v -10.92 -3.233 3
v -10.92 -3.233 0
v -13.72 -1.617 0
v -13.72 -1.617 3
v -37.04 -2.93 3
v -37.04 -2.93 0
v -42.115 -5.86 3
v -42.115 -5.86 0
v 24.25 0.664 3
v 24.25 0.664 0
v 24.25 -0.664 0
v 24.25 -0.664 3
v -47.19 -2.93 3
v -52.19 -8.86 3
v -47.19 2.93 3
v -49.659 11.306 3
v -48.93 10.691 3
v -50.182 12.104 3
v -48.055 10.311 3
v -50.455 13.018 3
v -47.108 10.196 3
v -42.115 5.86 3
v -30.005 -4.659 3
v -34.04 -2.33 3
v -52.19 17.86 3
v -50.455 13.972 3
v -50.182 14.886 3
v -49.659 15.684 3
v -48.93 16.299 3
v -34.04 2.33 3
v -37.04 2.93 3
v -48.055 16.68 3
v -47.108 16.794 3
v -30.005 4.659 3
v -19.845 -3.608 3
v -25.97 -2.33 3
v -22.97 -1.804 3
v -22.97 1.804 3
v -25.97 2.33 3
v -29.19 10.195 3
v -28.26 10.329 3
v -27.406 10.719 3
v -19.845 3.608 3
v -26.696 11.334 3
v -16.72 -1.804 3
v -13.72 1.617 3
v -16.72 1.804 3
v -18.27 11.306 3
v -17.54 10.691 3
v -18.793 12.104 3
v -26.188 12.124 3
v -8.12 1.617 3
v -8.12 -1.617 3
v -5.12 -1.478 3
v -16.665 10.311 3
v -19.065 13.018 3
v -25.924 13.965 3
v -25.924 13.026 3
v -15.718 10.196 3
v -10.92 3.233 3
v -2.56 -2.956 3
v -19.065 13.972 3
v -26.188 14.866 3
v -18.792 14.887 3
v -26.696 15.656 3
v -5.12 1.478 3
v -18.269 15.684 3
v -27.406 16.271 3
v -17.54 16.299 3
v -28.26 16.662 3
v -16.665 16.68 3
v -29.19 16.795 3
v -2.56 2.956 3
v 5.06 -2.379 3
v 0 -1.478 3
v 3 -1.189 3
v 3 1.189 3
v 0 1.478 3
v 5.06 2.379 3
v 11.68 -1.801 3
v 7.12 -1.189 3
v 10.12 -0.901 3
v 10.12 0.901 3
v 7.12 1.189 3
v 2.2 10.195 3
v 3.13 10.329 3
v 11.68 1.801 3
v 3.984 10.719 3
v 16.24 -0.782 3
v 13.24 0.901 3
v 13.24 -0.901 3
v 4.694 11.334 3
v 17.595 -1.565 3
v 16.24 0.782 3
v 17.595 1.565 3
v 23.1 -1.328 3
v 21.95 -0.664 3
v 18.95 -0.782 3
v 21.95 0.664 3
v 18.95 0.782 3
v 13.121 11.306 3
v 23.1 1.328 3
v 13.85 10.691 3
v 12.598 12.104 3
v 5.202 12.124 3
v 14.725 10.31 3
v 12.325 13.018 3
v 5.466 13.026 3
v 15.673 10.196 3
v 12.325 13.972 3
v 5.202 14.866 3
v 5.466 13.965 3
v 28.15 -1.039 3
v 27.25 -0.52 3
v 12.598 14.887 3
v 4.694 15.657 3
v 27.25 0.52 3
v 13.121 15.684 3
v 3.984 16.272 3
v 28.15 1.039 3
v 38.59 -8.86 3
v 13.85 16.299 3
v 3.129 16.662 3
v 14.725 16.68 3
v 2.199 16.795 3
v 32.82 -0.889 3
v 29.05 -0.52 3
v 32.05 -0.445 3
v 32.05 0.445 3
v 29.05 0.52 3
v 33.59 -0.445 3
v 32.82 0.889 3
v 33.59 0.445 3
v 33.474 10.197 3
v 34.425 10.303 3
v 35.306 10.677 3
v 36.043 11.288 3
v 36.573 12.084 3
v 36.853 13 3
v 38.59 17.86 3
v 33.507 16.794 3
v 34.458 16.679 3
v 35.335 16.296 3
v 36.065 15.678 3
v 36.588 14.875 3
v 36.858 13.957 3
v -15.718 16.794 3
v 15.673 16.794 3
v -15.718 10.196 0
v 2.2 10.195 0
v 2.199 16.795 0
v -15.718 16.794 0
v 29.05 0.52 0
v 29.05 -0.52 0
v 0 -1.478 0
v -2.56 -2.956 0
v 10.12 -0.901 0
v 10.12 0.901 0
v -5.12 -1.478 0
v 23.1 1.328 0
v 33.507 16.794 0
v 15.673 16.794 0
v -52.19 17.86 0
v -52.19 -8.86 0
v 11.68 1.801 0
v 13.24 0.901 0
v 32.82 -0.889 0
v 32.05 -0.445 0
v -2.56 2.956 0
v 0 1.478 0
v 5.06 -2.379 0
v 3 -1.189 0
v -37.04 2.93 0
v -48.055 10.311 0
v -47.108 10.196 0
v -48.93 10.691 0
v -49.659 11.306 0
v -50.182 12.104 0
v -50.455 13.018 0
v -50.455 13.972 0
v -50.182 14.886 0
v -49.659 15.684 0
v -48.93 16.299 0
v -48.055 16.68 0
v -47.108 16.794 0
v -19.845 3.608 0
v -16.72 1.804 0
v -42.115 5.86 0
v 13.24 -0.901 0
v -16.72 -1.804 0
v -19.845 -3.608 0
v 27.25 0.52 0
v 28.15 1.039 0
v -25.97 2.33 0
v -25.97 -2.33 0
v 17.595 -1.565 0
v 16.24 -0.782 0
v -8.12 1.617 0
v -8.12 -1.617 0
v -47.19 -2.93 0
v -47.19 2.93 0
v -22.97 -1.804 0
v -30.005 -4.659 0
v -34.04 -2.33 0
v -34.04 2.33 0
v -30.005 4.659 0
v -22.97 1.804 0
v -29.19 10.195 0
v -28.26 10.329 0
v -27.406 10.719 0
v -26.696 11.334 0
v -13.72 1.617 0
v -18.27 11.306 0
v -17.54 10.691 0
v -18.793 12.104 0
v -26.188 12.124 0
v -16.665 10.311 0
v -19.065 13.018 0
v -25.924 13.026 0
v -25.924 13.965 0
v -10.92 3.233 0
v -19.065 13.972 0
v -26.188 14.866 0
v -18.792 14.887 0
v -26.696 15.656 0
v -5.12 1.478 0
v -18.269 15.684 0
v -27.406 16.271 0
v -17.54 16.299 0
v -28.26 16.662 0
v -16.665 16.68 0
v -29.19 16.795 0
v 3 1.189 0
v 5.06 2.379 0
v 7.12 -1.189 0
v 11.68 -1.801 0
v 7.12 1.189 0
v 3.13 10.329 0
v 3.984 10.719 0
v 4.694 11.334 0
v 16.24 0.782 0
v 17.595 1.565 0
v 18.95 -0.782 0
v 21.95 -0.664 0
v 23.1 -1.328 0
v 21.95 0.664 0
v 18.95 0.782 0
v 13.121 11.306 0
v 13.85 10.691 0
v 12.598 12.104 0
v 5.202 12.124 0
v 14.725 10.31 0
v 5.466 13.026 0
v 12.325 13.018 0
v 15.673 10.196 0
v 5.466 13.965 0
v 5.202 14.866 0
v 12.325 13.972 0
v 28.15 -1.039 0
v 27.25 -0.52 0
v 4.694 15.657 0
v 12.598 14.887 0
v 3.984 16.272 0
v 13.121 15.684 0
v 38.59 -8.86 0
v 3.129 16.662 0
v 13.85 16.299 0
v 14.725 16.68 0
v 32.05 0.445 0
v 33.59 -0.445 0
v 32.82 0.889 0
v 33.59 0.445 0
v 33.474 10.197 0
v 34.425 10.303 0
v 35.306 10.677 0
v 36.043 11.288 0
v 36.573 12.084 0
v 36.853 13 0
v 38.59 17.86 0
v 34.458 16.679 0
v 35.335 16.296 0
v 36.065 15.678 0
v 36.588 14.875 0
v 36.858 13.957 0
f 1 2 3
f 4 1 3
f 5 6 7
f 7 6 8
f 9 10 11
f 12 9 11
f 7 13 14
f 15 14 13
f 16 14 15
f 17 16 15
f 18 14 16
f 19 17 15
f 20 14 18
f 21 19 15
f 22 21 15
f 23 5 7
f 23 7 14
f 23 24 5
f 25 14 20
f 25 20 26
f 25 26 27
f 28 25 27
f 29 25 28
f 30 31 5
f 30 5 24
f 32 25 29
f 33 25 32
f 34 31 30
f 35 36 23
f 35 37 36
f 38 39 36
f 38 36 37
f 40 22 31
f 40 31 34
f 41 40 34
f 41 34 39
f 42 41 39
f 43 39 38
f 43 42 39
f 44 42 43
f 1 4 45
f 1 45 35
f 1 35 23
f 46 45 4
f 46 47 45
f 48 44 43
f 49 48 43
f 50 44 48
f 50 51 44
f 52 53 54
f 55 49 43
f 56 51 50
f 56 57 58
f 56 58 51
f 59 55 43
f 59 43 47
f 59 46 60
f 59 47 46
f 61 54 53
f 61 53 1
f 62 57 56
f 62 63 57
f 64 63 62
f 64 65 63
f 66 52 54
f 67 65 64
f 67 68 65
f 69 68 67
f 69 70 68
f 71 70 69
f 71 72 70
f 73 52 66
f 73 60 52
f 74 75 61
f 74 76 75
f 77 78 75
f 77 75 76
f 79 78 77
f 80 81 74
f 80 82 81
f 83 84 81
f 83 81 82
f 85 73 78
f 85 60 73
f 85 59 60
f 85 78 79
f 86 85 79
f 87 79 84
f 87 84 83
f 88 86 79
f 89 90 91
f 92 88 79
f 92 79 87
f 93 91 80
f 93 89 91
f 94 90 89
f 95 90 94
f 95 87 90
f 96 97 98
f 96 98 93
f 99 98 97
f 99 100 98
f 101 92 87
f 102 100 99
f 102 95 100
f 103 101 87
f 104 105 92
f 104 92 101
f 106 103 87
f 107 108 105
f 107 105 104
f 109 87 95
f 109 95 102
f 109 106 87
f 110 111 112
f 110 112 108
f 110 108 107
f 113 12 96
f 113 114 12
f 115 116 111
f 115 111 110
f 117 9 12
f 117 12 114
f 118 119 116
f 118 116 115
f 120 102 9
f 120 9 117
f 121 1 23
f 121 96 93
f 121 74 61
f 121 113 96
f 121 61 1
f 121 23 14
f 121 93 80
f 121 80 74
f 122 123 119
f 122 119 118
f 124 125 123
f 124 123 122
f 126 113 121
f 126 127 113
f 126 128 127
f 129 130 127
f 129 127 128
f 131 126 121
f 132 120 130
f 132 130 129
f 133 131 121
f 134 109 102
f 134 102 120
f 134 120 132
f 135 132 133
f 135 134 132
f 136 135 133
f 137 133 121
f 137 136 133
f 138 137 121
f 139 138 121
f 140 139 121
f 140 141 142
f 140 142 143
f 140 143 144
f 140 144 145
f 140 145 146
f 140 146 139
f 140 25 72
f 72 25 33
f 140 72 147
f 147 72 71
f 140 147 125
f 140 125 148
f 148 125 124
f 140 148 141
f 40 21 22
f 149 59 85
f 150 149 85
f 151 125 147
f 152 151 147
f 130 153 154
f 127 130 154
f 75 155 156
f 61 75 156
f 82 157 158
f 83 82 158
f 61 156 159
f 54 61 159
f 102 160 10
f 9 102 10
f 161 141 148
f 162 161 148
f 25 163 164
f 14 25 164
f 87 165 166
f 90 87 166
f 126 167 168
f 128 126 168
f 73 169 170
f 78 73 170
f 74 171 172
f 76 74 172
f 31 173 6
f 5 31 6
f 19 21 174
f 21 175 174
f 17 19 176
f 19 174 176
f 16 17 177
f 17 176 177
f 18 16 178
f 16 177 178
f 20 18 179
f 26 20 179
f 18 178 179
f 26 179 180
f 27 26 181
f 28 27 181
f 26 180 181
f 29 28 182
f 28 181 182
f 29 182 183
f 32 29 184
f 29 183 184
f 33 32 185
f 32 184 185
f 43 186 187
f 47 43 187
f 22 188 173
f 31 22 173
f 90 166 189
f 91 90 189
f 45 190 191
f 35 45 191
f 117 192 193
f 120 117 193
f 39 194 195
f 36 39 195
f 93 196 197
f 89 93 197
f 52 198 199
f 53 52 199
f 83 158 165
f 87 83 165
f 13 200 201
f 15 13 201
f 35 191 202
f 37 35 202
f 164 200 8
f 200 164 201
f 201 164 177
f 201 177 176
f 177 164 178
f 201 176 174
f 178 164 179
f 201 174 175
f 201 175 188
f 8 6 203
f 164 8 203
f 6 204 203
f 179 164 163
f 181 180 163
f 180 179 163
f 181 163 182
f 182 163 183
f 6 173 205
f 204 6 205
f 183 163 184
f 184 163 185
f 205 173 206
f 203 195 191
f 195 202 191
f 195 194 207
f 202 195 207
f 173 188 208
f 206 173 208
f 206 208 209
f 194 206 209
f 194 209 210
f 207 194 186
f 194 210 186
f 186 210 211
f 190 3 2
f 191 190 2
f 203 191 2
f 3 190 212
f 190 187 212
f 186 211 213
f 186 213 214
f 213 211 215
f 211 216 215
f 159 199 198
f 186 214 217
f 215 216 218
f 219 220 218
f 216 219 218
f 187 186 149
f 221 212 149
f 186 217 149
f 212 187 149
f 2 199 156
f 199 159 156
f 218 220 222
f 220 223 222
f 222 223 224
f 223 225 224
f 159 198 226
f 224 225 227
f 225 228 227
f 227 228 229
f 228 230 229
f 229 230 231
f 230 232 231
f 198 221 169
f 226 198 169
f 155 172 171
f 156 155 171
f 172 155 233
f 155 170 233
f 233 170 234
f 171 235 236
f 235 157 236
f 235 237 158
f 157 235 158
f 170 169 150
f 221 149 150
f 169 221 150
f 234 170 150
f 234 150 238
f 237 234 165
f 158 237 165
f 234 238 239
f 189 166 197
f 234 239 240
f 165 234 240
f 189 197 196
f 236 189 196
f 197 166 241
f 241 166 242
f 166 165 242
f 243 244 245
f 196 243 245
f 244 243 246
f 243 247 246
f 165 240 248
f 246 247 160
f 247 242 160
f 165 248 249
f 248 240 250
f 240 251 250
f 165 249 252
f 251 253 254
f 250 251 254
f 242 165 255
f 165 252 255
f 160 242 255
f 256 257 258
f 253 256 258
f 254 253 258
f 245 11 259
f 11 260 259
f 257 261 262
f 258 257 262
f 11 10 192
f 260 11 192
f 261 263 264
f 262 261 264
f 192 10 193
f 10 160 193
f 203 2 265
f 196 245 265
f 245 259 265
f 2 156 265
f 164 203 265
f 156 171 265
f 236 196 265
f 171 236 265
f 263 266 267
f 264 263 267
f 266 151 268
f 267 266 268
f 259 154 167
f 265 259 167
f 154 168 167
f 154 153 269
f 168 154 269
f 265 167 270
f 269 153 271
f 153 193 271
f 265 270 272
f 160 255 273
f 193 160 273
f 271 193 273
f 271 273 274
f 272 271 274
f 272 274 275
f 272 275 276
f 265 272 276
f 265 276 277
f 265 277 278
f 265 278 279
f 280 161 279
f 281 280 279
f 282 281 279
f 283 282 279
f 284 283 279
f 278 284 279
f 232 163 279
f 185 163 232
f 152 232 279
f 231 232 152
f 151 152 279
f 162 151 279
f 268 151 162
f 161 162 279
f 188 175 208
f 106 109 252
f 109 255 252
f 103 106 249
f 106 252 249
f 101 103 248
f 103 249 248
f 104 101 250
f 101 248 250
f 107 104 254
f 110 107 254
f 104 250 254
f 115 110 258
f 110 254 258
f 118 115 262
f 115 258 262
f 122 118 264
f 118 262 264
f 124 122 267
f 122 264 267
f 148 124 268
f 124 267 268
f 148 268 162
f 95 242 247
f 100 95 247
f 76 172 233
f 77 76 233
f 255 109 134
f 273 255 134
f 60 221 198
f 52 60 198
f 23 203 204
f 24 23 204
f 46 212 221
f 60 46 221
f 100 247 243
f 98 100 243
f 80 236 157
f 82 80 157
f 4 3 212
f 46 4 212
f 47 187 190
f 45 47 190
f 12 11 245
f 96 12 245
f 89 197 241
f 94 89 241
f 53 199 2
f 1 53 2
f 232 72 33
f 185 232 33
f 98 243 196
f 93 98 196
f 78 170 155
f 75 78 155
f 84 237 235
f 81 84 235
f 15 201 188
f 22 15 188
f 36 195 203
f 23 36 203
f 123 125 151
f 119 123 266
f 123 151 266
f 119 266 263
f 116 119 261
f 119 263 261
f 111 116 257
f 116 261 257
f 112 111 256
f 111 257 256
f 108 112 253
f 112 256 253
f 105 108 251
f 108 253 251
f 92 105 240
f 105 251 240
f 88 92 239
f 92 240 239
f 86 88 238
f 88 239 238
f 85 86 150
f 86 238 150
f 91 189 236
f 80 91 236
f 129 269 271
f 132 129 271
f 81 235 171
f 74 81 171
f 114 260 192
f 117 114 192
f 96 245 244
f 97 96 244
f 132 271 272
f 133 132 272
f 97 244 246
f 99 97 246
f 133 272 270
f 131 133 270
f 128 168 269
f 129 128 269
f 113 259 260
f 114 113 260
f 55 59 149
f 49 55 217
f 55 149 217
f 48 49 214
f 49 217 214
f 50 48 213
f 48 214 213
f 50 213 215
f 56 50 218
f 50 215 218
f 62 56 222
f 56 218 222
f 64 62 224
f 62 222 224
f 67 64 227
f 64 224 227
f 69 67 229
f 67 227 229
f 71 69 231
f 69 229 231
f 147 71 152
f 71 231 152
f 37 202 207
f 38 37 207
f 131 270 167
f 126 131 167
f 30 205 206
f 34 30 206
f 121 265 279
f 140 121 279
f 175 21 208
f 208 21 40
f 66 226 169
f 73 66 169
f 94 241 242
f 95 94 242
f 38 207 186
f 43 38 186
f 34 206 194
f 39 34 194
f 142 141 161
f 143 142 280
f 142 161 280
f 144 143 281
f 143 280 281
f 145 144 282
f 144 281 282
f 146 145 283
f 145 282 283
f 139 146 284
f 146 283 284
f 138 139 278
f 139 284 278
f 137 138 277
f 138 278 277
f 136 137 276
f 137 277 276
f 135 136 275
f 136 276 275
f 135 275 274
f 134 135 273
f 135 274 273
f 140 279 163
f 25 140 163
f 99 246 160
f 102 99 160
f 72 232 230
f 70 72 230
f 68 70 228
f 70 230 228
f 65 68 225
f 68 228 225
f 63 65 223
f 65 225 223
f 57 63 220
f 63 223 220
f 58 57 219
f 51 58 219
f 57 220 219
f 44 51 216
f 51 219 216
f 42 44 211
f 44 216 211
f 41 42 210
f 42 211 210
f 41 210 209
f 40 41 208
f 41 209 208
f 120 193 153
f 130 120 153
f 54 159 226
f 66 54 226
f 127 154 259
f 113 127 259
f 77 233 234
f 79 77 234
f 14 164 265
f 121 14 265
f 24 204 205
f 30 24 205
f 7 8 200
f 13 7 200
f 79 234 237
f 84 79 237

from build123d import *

# Parameters (mm, degrees)
F0_W     = 90.78
F0_H     = 17.7202104645
F1_DEPTH = 3
F3_D     = 6.6
F5_DEPTH = 25


with BuildPart() as f1:
    # F0 (on Top) → F1 (new body)
    with BuildSketch(Plane.XY):
        Polygon((-52.19, 13.3601052323), (-52.19, 8.8601052323), (38.59, 8.8601052323), (38.59, 13.3601052323), (38.59, 17.8601052323), (-52.19, 17.8601052323), align=None)
        with Locations((-6.8, 0)):
            Rectangle(F0_W, F0_H)
        Polygon((-42.115, 5.8601052323), (-37.04, 2.9300526161), (-37.04, -2.9300526161), (-42.115, -5.8601052323), (-47.19, -2.9300526161), (-47.19, 2.9300526161), align=None, mode=Mode.SUBTRACT)
        Polygon((-30.005, 4.6592166724), (-25.97, 2.3296083362), (-25.97, -2.3296083362), (-30.005, -4.6592166724), (-34.04, -2.3296083362), (-34.04, 2.3296083362), align=None, mode=Mode.SUBTRACT)
        Polygon((-19.845, 3.6084391824), (-16.72, 1.8042195912), (-16.72, -1.8042195912), (-19.845, -3.6084391824), (-22.97, -1.8042195912), (-22.97, 1.8042195912), align=None, mode=Mode.SUBTRACT)
        Polygon((-10.92, 3.2331615075), (-8.12, 1.6165807537), (-8.12, -1.6165807537), (-10.92, -3.2331615075), (-13.72, -1.6165807537), (-13.72, 1.6165807537), align=None, mode=Mode.SUBTRACT)
        Polygon((-2.56, 2.9560333783), (0, 1.4780166891), (0, -1.4780166891), (-2.56, -2.9560333783), (-5.12, -1.4780166891), (-5.12, 1.4780166891), align=None, mode=Mode.SUBTRACT)
        Polygon((5.06, 2.3786831091), (7.12, 1.1893415545), (7.12, -1.1893415545), (5.06, -2.3786831091), (3, -1.1893415545), (3, 1.1893415545), align=None, mode=Mode.SUBTRACT)
        Polygon((11.68, 1.8013328399), (13.24, 0.9006664199), (13.24, -0.9006664199), (11.68, -1.8013328399), (10.12, -0.9006664199), (10.12, 0.9006664199), align=None, mode=Mode.SUBTRACT)
        Polygon((17.595, 1.5646192295), (18.95, 0.7823096148), (18.95, -0.7823096148), (17.595, -1.5646192295), (16.24, -0.7823096148), (16.24, 0.7823096148), align=None, mode=Mode.SUBTRACT)
        Polygon((23.1, 1.3279056191), (24.25, 0.6639528096), (24.25, -0.6639528096), (23.1, -1.3279056191), (21.95, -0.6639528096), (21.95, 0.6639528096), align=None, mode=Mode.SUBTRACT)
        Polygon((28.15, 1.0392304845), (29.05, 0.5196152423), (29.05, -0.5196152423), (28.15, -1.0392304845), (27.25, -0.5196152423), (27.25, 0.5196152423), align=None, mode=Mode.SUBTRACT)
        Polygon((32.82, 0.8891194146), (33.59, 0.4445597073), (33.59, -0.4445597073), (32.82, -0.8891194146), (32.05, -0.4445597073), (32.05, 0.4445597073), align=None, mode=Mode.SUBTRACT)
    extrude(amount=F1_DEPTH)

    # F3 (through all)
    with Locations(Plane.XY.offset(3)):
        with Locations((-47.19, 13.4951905284), (-29.19, 13.4951905284), (-15.8, 13.4951905284), (2.2, 13.4951905284), (15.59, 13.4951905284), (33.59, 13.4951905284)):
            Hole(F3_D / 2)

    # F4 (on face) → F5 (cut)
    with BuildSketch(Plane.XY.offset(3)):
        with BuildLine():
            Line((-29.1901885501, 16.795190523), (-47.1078067859, 16.794166775))
            ThreePointArc((-47.1078067859, 16.794166775), (-44.8276666613, 15.79939998), (-43.89, 13.4951905284))
            ThreePointArc((-43.89, 13.4951905284), (-44.8276666613, 11.1909810768), (-47.1078067859, 10.1962142818))
            Line((-47.1078067859, 10.1962142818), (-29.1901885501, 10.1951905338))
            ThreePointArc((-29.1901885501, 10.1951905338), (-32.49, 13.4951905284), (-29.1901885501, 16.795190523))
        make_face()
        with BuildLine():
            Line((2.1994360639, 16.7951904802), (-15.7178067781, 16.7941667748))
            ThreePointArc((-15.7178067781, 16.7941667748), (-13.4376666586, 15.7993999772), (-12.5, 13.4951905284))
            ThreePointArc((-12.5, 13.4951905284), (-13.4377971224, 11.1908473324), (-15.7181803424, 10.1962049959))
            Line((-15.7181803424, 10.1962049959), (2.1998131641, 10.1951905337))
            ThreePointArc((2.1998131641, 10.1951905337), (-1.0999999946, 13.4950019783), (2.1994360639, 16.7951904802))
        make_face()
        with BuildLine():
            Line((33.5074298033, 16.794157361), (15.6725701967, 16.794157361))
            ThreePointArc((15.6725701967, 16.794157361), (17.9524649891, 15.799265001), (18.89, 13.4951905284))
            ThreePointArc((18.89, 13.4951905284), (17.9524649891, 11.1911160558), (15.6725701967, 10.1962236958))
            Line((15.6725701967, 10.1962236958), (33.4736921866, 10.1972407876))
            ThreePointArc((33.4736921866, 10.1972407876), (30.2900431541, 13.5120670006), (33.5074298033, 16.794157361))
        make_face()
    extrude(amount=-F5_DEPTH, mode=Mode.SUBTRACT)


solid = f1.part
